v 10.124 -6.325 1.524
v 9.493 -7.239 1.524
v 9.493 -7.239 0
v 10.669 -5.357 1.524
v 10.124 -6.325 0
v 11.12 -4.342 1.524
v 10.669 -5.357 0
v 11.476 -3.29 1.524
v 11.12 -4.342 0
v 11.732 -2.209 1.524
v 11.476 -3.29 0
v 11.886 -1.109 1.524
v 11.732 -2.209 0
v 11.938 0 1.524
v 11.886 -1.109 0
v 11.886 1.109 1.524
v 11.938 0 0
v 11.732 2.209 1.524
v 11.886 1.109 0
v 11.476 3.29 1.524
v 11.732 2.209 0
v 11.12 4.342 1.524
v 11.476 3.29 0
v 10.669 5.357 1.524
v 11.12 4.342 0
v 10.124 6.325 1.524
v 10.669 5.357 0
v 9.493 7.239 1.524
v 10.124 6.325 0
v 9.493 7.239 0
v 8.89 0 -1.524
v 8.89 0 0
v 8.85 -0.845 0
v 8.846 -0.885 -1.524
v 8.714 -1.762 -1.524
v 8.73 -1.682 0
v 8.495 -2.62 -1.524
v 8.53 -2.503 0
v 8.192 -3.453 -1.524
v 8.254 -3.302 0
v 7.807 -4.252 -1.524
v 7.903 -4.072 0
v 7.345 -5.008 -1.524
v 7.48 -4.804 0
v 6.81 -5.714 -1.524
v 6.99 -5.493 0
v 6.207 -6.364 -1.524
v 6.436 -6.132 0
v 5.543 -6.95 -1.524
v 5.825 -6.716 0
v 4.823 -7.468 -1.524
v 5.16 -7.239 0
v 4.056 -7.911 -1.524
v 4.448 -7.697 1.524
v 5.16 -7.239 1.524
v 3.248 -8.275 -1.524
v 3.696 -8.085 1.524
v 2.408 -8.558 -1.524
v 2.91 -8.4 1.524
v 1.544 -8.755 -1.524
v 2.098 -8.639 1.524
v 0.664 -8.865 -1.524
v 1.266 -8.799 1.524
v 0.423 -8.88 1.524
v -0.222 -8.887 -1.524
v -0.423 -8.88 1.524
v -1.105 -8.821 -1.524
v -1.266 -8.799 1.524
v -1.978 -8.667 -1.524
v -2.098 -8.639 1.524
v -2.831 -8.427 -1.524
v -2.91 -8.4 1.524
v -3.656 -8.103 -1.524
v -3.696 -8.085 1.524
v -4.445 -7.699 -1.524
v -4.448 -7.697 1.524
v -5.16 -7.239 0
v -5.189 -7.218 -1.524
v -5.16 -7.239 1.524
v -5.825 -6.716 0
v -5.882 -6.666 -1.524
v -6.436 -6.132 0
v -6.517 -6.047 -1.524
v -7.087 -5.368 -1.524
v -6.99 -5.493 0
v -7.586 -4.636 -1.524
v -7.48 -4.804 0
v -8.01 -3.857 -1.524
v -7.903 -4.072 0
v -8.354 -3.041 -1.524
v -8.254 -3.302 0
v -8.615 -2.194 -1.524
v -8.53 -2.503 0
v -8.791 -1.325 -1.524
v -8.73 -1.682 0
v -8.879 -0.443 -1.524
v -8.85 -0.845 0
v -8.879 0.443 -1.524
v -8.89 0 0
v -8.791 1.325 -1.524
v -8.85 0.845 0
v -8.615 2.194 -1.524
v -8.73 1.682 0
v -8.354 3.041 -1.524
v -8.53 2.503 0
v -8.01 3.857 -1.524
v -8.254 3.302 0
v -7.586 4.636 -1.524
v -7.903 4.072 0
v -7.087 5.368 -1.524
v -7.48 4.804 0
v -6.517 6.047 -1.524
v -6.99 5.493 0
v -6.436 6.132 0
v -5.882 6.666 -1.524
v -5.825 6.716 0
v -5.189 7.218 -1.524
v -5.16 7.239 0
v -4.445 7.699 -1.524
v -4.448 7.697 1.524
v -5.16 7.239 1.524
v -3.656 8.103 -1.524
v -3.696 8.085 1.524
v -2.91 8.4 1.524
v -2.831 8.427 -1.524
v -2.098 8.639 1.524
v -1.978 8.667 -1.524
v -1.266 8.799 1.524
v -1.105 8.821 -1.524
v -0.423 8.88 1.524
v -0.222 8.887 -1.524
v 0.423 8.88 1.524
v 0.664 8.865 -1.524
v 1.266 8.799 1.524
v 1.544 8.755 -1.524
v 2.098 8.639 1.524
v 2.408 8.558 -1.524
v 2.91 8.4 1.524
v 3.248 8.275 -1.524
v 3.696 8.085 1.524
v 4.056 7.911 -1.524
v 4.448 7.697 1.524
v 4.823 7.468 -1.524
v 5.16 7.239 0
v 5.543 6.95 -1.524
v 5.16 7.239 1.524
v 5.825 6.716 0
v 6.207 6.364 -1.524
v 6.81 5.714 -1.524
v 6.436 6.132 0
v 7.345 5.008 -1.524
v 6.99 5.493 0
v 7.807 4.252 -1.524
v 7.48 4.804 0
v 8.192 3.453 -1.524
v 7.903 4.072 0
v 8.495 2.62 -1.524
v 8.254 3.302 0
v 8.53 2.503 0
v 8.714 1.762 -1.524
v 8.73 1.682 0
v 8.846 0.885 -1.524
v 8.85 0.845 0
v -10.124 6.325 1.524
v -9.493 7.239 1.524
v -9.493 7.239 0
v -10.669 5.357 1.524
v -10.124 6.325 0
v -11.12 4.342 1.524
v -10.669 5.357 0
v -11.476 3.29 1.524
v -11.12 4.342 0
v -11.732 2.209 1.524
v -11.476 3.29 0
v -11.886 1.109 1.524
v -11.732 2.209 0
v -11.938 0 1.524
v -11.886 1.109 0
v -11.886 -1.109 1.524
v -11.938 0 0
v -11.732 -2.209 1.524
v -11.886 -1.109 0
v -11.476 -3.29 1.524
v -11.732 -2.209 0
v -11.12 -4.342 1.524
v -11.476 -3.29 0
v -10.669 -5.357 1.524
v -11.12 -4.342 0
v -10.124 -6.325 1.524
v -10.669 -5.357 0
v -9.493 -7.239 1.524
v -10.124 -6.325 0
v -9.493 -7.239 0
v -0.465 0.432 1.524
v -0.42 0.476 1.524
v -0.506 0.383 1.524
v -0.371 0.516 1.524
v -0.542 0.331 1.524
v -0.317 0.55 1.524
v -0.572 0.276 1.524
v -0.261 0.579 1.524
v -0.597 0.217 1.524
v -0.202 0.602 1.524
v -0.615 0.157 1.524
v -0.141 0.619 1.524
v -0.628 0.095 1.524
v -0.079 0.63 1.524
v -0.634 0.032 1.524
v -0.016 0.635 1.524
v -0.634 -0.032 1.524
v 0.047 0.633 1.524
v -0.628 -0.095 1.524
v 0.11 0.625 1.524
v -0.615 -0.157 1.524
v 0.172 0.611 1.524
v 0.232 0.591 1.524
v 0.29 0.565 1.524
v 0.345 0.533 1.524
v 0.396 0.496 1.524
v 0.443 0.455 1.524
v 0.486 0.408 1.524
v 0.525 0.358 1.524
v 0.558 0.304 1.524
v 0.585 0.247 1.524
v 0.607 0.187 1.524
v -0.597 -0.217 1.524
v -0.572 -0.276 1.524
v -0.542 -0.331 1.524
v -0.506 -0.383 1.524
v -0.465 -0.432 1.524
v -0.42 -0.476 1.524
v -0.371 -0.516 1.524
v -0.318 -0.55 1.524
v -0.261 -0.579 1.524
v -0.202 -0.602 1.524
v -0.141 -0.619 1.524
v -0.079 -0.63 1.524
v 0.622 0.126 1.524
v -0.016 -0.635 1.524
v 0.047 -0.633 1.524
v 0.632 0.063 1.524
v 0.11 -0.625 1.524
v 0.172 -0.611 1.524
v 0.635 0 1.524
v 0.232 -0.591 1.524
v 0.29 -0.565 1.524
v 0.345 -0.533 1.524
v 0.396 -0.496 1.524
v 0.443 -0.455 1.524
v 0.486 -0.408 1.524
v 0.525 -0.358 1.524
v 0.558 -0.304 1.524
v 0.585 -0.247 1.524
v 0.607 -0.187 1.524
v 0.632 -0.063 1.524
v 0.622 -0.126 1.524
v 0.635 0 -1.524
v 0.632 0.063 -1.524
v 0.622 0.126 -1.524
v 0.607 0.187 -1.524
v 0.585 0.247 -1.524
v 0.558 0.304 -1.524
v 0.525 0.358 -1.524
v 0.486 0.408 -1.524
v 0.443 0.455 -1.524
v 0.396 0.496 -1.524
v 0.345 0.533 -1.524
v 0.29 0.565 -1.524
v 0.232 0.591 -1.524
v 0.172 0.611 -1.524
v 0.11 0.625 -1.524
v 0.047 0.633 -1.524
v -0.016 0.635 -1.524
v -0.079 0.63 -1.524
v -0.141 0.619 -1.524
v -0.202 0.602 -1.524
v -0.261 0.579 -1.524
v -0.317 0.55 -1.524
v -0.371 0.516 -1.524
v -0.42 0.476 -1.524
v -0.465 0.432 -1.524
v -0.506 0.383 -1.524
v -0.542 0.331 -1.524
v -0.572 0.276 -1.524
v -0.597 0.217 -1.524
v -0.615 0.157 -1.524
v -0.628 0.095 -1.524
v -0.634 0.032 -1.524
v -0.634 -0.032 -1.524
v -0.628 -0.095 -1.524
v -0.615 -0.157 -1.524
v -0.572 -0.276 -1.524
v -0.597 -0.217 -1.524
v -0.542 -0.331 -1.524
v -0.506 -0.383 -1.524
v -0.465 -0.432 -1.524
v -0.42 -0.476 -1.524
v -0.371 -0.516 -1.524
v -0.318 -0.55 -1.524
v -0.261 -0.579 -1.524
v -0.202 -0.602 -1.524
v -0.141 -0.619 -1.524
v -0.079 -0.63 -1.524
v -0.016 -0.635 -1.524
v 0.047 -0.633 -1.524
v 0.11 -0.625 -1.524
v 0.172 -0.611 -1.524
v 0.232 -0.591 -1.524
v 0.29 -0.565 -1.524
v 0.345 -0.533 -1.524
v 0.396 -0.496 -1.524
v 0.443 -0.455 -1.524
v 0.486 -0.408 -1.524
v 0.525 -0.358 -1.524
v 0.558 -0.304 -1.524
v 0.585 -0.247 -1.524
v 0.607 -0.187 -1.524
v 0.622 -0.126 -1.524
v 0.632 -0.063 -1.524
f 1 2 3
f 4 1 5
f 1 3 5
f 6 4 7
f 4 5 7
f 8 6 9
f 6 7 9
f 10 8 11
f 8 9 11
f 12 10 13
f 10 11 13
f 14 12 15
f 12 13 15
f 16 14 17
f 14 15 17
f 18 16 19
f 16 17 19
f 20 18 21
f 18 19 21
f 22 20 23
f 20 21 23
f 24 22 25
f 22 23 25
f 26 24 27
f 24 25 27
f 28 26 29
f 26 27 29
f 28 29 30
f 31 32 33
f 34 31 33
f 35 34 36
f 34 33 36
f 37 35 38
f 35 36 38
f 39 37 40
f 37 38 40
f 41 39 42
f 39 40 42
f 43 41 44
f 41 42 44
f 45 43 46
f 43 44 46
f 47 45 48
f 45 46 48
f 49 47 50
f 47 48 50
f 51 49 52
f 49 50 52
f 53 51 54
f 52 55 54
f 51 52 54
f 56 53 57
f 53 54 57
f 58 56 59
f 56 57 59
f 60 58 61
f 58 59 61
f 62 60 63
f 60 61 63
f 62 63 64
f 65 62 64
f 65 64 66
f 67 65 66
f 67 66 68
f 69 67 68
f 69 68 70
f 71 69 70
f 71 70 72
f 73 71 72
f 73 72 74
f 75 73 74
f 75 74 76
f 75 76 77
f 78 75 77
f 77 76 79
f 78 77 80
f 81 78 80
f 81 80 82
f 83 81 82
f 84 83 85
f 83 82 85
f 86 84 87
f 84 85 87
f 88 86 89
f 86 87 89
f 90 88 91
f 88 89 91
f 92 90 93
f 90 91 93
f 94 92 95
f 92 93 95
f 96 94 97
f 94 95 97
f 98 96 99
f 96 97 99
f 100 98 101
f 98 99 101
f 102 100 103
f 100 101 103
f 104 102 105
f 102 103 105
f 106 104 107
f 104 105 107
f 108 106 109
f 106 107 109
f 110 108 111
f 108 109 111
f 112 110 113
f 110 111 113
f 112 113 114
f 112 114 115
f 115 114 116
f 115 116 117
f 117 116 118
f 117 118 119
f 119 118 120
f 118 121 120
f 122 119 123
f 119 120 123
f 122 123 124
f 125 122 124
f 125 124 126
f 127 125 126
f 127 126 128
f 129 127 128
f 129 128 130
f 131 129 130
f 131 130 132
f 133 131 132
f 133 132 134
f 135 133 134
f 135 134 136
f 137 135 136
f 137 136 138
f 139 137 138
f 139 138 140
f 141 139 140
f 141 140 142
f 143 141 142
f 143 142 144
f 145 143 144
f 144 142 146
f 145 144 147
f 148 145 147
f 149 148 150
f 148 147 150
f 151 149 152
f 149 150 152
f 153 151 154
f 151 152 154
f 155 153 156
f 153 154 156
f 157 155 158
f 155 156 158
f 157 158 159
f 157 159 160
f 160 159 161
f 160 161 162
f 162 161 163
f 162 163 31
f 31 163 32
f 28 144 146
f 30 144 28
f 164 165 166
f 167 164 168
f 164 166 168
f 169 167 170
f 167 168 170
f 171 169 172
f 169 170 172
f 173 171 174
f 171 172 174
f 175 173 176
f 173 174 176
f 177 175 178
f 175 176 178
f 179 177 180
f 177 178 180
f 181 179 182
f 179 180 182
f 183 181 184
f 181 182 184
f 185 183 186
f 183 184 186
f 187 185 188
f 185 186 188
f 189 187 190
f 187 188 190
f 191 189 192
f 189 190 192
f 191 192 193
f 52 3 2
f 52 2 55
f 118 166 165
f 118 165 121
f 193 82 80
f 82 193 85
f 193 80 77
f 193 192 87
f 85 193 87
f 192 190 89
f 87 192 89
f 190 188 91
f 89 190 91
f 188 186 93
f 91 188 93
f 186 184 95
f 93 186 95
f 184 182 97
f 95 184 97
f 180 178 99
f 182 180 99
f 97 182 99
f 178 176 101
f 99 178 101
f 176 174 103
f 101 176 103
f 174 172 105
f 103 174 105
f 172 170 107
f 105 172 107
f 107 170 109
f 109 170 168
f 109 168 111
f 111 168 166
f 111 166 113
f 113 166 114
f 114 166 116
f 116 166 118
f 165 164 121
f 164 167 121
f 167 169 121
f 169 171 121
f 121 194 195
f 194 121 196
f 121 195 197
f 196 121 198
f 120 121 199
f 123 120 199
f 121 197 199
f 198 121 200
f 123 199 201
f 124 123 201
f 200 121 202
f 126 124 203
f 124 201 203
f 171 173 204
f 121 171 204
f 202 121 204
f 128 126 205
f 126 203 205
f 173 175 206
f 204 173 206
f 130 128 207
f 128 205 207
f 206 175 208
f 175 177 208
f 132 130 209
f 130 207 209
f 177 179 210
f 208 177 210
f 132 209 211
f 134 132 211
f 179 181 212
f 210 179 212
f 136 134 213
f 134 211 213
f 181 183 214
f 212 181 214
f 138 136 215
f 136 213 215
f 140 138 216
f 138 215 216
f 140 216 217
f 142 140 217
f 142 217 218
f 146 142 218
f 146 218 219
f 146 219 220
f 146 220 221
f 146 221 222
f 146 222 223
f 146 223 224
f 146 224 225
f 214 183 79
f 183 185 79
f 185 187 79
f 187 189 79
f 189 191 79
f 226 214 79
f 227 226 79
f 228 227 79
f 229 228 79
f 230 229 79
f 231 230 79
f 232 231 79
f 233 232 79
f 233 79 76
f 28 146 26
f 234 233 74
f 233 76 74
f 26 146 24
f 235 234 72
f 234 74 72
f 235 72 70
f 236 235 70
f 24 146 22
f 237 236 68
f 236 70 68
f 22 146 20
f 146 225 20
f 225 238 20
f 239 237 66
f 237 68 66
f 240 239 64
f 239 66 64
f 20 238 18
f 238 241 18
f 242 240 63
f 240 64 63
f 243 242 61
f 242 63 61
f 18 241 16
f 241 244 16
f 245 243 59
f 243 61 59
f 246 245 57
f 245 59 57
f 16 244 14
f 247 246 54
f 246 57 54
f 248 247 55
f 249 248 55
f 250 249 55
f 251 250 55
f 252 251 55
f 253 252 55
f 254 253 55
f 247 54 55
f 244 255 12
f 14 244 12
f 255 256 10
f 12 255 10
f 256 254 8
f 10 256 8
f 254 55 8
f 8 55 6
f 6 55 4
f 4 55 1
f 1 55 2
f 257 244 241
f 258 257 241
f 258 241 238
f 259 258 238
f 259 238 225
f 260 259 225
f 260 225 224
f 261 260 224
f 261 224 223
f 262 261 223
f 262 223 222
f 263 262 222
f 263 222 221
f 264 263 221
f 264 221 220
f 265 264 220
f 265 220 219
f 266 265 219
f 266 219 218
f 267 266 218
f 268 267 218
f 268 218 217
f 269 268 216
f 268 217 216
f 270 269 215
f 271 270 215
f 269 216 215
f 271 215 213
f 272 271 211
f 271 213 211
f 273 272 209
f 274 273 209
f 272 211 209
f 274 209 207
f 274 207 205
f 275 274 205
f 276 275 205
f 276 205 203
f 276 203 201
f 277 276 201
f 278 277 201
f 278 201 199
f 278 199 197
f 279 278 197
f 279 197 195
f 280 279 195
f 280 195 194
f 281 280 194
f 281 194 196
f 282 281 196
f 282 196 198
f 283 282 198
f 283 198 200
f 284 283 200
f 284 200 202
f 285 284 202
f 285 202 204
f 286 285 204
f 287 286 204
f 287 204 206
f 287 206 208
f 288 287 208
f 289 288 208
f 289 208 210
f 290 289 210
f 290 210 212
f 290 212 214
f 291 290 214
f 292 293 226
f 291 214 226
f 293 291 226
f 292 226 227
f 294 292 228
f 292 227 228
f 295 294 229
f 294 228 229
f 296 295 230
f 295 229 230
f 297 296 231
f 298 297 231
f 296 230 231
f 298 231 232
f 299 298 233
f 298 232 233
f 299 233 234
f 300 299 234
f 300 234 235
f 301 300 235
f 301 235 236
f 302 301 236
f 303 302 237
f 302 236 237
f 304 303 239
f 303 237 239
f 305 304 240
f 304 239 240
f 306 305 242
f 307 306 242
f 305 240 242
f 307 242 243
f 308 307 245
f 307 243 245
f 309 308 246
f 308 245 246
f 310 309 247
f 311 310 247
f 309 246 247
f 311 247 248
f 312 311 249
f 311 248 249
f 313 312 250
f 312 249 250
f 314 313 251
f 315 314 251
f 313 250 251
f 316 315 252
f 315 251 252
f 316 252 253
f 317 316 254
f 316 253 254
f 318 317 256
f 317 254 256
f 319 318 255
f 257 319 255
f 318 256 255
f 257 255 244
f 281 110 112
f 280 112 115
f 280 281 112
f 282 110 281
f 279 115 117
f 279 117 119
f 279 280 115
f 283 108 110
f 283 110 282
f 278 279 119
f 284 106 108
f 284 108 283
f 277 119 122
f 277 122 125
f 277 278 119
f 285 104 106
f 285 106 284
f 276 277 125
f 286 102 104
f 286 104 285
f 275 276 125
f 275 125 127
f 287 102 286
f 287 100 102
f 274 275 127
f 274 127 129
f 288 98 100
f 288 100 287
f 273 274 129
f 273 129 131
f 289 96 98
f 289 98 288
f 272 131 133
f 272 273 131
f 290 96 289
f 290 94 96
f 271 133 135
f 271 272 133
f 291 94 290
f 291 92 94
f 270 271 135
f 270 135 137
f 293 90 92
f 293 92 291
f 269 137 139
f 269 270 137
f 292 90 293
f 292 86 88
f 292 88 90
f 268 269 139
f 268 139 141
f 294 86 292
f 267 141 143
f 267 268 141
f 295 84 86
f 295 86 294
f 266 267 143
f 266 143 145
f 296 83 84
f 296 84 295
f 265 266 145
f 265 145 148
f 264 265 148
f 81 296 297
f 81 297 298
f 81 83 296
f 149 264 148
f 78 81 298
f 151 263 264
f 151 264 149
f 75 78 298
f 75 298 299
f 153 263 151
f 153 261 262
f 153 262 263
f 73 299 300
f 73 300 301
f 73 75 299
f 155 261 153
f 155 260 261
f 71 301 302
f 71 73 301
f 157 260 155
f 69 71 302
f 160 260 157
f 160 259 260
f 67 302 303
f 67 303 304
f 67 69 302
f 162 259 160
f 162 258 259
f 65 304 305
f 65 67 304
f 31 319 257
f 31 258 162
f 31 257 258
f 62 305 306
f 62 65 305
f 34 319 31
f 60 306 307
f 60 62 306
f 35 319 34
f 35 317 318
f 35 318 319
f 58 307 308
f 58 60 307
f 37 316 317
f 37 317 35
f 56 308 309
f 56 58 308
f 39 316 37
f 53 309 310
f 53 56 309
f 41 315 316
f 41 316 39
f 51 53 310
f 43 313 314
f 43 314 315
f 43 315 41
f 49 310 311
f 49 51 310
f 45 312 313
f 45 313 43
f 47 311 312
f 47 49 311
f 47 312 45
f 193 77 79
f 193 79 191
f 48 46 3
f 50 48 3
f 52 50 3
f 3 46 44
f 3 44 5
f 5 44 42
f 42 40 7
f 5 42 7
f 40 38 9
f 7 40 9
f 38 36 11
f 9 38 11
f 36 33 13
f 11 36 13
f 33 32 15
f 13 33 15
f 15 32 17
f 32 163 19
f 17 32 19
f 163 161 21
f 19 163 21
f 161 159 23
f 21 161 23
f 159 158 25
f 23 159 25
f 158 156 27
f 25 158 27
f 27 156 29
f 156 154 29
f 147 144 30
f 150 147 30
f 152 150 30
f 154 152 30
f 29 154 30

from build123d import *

# Parameters (mm, degrees)
F0_R          = 11.938
F2_DEPTH      = 1.524
F3_DEPTH      = 2.54
F3_DEPTH_BACK = 25.4
F4_R          = 8.89
F5_DEPTH      = 1.524
F6_R          = 8.89
F7_DEPTH      = 1.524
F8_R          = 0.635
F9_DEPTH      = 25.4
F9_DEPTH_BACK = 25.4


with BuildPart() as f2:
    # F0 (on Top) → F2 (new body)
    with BuildSketch(Plane.XY):
        Circle(F0_R)
    extrude(amount=F2_DEPTH)

    # F1 (on face) → F3 (cut, two sides)
    with BuildSketch(Plane.XY) as f3_sk:
        with BuildLine():
            Line((-9.492772, 7.239), (9.492772, 7.239))
            ThreePointArc((9.492772, 7.239), (0, 11.938), (-9.492772, 7.239))
        make_face()
        with BuildLine():
            Line((9.492772, -7.239), (-9.492772, -7.239))
            ThreePointArc((-9.492772, -7.239), (0, -11.938), (9.492772, -7.239))
        make_face()
    extrude(amount=F3_DEPTH, mode=Mode.SUBTRACT)
    extrude(f3_sk.sketch, amount=-F3_DEPTH_BACK, mode=Mode.SUBTRACT)

    # F4 (on face) → F5 (join)
    with BuildSketch(Plane(origin=(0, 0, 0), x_dir=(1, 0, 0), z_dir=(0, 0, -1))):
        Circle(F4_R)
    extrude(amount=-F5_DEPTH)

    # F6 (on face) → F7 (join)
    with BuildSketch(Plane(origin=(0, 0, 0), x_dir=(1, 0, 0), z_dir=(0, 0, -1))):
        Circle(F6_R)
    extrude(amount=F7_DEPTH)

    # F8 (on face) → F9 (cut, two sides)
    with BuildSketch(Plane.XY.offset(1.524)) as f9_sk:
        Circle(F8_R)
    extrude(amount=-F9_DEPTH, mode=Mode.SUBTRACT)
    extrude(f9_sk.sketch, amount=-F9_DEPTH_BACK, mode=Mode.SUBTRACT)


solid = f2.part
